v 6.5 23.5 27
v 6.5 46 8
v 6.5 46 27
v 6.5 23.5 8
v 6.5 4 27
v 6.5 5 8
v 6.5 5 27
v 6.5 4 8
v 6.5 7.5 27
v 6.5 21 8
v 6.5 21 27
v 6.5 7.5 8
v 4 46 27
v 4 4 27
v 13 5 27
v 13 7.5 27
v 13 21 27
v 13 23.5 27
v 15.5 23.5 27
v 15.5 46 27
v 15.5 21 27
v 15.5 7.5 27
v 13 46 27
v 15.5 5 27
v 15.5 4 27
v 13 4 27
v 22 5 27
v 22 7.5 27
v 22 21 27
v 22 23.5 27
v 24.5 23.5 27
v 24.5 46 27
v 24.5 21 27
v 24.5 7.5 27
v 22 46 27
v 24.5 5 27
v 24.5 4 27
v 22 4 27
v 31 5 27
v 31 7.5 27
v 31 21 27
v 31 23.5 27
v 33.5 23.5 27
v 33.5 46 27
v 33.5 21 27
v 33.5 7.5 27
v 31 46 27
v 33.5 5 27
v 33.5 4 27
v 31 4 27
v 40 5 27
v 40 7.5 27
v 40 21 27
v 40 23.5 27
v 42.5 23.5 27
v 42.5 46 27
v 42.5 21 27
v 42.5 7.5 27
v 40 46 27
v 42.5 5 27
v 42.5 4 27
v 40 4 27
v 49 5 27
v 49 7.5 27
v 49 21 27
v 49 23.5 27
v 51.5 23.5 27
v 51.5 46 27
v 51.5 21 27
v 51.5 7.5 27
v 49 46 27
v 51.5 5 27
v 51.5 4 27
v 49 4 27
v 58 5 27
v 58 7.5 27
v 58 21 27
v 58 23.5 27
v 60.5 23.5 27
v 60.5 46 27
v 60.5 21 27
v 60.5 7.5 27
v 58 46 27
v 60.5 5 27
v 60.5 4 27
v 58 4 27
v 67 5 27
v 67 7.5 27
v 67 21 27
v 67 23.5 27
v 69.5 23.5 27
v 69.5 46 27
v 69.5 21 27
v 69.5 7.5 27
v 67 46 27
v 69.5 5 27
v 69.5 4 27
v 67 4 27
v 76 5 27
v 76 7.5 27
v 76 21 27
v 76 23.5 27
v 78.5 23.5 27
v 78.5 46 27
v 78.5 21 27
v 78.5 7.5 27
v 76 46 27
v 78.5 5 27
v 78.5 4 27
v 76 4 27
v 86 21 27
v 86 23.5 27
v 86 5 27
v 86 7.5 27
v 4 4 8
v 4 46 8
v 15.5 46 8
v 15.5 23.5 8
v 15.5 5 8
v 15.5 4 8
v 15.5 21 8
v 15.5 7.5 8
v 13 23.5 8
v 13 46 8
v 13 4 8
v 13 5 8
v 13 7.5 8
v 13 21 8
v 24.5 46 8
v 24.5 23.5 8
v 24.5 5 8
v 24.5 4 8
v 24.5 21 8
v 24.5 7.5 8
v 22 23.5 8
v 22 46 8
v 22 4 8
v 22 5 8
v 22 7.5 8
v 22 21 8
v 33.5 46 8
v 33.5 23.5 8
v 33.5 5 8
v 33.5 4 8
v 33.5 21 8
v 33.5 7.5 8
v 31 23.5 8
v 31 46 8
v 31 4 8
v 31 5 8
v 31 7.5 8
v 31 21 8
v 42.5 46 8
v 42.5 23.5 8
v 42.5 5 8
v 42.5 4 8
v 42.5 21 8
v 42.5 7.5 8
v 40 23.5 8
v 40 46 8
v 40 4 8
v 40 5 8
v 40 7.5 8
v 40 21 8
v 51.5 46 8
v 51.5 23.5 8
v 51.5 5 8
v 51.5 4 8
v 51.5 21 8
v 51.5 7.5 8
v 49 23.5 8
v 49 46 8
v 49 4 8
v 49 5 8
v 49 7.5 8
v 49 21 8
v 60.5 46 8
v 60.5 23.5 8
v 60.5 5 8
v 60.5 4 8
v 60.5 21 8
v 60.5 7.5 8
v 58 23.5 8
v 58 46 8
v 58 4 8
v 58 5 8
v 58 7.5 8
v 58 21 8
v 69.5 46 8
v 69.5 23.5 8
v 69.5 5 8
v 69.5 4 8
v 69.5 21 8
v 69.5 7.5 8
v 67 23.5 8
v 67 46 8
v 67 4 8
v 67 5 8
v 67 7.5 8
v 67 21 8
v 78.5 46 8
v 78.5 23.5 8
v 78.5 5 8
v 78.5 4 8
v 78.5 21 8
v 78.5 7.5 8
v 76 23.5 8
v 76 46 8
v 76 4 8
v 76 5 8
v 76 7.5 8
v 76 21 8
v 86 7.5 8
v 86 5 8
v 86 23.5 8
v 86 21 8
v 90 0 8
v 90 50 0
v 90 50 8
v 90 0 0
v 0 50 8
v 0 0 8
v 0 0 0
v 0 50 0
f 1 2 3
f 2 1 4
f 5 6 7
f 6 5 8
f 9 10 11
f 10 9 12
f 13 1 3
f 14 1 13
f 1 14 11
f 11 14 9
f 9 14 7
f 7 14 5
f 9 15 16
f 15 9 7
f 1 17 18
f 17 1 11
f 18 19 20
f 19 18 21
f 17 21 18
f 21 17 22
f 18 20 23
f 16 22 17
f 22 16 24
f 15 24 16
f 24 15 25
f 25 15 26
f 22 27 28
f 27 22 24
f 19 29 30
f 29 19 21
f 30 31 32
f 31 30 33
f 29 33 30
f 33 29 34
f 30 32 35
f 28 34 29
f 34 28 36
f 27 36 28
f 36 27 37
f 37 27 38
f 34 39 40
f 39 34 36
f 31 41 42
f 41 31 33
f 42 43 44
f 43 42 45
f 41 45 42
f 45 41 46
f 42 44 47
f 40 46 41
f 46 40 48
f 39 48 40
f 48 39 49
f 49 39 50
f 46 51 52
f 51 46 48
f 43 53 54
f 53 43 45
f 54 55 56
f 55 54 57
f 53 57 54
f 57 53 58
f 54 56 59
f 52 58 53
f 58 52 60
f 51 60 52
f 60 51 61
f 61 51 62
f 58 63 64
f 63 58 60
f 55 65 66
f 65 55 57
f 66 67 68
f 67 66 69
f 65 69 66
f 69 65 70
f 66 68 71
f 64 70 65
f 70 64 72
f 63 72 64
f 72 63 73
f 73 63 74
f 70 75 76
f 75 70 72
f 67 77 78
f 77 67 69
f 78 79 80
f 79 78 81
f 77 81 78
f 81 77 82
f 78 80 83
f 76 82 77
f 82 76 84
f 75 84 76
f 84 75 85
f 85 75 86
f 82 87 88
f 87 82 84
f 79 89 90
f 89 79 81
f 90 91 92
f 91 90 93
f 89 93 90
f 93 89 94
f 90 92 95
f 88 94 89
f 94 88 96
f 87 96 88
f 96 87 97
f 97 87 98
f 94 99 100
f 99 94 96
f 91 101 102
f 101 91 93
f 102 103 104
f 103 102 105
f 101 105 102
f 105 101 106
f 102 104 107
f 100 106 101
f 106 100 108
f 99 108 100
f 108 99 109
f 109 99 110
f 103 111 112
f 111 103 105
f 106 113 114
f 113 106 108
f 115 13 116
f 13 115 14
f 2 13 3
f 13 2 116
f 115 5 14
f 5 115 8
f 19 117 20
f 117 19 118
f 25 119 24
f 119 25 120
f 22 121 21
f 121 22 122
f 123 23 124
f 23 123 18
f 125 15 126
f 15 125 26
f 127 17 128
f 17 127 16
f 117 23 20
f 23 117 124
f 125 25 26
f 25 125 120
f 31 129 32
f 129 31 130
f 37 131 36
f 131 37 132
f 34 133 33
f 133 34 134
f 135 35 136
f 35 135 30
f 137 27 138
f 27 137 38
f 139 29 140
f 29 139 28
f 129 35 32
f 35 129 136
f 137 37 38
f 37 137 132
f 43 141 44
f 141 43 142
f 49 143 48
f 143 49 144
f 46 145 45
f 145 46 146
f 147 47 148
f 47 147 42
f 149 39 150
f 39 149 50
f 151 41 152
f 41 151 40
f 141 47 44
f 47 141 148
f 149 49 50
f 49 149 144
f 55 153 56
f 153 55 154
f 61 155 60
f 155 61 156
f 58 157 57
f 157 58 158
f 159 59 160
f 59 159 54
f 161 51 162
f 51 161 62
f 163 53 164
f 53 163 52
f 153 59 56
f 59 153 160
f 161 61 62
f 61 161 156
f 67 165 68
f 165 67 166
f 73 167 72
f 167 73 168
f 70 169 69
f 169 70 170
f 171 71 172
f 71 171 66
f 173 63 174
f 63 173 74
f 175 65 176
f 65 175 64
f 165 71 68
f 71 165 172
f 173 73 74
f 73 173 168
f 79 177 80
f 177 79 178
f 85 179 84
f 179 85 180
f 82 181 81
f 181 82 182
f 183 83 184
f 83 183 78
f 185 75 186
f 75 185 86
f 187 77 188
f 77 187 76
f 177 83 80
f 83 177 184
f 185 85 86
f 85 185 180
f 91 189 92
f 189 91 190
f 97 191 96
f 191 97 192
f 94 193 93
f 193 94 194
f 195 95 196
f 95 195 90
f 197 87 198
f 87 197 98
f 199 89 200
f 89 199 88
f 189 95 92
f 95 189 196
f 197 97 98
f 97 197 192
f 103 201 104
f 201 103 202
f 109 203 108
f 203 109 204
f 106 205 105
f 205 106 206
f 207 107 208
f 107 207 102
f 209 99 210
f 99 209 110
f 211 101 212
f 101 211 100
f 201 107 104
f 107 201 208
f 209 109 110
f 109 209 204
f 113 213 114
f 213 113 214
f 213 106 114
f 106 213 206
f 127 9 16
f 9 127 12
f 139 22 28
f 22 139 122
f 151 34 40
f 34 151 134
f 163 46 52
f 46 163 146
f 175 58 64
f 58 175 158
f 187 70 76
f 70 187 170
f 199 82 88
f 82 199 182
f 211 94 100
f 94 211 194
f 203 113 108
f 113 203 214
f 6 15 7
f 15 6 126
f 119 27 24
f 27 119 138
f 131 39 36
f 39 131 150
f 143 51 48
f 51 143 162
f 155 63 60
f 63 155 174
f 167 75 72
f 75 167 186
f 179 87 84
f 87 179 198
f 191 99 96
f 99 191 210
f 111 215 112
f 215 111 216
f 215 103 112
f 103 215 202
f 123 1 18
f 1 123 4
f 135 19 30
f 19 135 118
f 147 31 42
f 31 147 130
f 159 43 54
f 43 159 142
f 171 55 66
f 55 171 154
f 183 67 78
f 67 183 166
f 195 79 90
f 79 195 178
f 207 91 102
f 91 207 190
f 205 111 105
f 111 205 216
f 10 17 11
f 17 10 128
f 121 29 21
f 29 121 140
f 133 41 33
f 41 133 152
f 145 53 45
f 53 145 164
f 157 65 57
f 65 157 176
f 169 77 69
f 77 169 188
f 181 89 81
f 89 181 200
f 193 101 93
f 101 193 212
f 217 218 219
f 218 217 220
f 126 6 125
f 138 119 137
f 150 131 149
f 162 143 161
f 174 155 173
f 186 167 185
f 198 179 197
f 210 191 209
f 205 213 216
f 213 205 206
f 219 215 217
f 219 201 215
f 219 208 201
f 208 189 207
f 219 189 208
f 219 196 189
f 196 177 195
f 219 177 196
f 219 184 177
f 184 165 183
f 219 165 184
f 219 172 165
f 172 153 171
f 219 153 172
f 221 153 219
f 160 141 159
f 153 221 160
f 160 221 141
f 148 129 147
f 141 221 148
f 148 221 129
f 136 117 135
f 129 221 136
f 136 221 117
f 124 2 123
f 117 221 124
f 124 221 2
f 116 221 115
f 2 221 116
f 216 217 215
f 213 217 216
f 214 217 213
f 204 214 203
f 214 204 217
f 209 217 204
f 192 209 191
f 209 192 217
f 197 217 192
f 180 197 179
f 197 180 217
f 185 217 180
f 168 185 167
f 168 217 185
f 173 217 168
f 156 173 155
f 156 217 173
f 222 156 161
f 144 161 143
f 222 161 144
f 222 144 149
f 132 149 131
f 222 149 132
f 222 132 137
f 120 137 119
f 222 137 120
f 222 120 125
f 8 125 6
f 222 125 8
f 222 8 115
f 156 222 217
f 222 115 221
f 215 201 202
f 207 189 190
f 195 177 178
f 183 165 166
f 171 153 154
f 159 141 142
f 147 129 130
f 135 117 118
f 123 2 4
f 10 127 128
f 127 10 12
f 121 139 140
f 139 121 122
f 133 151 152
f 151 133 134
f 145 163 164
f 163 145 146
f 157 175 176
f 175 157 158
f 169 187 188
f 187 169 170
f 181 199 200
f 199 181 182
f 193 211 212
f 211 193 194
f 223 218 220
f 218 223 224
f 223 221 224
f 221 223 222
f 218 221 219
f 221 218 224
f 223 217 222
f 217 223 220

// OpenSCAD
$fn = 32;

// ----------------------------------------------------------------------
// Heatsink: cross fin block
// ----------------------------------------------------------------------

// --- parameters (mm) ---
base_l = 90;              // base length, X
base_w = 50;              // base width, Y
base_t = 8;               // base plate thickness
fin_h = 20;               // fin height above the base
fin_t = 2.5;              // fin thickness
edge = 4;                 // margin from the base ends
pitch = 9;                // fin pitch
rib_pitch = 16;           // cross rib pitch

n_fins = floor((base_l - 2 * edge - fin_t) / pitch) + 1;  // fin count
total_h = base_t + fin_h - 1;  // overall height
n_ribs = floor((base_w - 2 * edge) / rib_pitch);  // rib count

union() {
  cube([base_l, base_w, base_t]);
  for (i = [0 : n_fins - 1])
    translate([edge + i * pitch, edge, base_t - 1])
      cube([fin_t, base_w - 2 * edge, fin_h]);
  for (i = [0 : n_ribs - 1])
    translate([edge, edge + 1 + i * rib_pitch, base_t - 1])
      cube([base_l - 2 * edge, fin_t, fin_h]);
}
